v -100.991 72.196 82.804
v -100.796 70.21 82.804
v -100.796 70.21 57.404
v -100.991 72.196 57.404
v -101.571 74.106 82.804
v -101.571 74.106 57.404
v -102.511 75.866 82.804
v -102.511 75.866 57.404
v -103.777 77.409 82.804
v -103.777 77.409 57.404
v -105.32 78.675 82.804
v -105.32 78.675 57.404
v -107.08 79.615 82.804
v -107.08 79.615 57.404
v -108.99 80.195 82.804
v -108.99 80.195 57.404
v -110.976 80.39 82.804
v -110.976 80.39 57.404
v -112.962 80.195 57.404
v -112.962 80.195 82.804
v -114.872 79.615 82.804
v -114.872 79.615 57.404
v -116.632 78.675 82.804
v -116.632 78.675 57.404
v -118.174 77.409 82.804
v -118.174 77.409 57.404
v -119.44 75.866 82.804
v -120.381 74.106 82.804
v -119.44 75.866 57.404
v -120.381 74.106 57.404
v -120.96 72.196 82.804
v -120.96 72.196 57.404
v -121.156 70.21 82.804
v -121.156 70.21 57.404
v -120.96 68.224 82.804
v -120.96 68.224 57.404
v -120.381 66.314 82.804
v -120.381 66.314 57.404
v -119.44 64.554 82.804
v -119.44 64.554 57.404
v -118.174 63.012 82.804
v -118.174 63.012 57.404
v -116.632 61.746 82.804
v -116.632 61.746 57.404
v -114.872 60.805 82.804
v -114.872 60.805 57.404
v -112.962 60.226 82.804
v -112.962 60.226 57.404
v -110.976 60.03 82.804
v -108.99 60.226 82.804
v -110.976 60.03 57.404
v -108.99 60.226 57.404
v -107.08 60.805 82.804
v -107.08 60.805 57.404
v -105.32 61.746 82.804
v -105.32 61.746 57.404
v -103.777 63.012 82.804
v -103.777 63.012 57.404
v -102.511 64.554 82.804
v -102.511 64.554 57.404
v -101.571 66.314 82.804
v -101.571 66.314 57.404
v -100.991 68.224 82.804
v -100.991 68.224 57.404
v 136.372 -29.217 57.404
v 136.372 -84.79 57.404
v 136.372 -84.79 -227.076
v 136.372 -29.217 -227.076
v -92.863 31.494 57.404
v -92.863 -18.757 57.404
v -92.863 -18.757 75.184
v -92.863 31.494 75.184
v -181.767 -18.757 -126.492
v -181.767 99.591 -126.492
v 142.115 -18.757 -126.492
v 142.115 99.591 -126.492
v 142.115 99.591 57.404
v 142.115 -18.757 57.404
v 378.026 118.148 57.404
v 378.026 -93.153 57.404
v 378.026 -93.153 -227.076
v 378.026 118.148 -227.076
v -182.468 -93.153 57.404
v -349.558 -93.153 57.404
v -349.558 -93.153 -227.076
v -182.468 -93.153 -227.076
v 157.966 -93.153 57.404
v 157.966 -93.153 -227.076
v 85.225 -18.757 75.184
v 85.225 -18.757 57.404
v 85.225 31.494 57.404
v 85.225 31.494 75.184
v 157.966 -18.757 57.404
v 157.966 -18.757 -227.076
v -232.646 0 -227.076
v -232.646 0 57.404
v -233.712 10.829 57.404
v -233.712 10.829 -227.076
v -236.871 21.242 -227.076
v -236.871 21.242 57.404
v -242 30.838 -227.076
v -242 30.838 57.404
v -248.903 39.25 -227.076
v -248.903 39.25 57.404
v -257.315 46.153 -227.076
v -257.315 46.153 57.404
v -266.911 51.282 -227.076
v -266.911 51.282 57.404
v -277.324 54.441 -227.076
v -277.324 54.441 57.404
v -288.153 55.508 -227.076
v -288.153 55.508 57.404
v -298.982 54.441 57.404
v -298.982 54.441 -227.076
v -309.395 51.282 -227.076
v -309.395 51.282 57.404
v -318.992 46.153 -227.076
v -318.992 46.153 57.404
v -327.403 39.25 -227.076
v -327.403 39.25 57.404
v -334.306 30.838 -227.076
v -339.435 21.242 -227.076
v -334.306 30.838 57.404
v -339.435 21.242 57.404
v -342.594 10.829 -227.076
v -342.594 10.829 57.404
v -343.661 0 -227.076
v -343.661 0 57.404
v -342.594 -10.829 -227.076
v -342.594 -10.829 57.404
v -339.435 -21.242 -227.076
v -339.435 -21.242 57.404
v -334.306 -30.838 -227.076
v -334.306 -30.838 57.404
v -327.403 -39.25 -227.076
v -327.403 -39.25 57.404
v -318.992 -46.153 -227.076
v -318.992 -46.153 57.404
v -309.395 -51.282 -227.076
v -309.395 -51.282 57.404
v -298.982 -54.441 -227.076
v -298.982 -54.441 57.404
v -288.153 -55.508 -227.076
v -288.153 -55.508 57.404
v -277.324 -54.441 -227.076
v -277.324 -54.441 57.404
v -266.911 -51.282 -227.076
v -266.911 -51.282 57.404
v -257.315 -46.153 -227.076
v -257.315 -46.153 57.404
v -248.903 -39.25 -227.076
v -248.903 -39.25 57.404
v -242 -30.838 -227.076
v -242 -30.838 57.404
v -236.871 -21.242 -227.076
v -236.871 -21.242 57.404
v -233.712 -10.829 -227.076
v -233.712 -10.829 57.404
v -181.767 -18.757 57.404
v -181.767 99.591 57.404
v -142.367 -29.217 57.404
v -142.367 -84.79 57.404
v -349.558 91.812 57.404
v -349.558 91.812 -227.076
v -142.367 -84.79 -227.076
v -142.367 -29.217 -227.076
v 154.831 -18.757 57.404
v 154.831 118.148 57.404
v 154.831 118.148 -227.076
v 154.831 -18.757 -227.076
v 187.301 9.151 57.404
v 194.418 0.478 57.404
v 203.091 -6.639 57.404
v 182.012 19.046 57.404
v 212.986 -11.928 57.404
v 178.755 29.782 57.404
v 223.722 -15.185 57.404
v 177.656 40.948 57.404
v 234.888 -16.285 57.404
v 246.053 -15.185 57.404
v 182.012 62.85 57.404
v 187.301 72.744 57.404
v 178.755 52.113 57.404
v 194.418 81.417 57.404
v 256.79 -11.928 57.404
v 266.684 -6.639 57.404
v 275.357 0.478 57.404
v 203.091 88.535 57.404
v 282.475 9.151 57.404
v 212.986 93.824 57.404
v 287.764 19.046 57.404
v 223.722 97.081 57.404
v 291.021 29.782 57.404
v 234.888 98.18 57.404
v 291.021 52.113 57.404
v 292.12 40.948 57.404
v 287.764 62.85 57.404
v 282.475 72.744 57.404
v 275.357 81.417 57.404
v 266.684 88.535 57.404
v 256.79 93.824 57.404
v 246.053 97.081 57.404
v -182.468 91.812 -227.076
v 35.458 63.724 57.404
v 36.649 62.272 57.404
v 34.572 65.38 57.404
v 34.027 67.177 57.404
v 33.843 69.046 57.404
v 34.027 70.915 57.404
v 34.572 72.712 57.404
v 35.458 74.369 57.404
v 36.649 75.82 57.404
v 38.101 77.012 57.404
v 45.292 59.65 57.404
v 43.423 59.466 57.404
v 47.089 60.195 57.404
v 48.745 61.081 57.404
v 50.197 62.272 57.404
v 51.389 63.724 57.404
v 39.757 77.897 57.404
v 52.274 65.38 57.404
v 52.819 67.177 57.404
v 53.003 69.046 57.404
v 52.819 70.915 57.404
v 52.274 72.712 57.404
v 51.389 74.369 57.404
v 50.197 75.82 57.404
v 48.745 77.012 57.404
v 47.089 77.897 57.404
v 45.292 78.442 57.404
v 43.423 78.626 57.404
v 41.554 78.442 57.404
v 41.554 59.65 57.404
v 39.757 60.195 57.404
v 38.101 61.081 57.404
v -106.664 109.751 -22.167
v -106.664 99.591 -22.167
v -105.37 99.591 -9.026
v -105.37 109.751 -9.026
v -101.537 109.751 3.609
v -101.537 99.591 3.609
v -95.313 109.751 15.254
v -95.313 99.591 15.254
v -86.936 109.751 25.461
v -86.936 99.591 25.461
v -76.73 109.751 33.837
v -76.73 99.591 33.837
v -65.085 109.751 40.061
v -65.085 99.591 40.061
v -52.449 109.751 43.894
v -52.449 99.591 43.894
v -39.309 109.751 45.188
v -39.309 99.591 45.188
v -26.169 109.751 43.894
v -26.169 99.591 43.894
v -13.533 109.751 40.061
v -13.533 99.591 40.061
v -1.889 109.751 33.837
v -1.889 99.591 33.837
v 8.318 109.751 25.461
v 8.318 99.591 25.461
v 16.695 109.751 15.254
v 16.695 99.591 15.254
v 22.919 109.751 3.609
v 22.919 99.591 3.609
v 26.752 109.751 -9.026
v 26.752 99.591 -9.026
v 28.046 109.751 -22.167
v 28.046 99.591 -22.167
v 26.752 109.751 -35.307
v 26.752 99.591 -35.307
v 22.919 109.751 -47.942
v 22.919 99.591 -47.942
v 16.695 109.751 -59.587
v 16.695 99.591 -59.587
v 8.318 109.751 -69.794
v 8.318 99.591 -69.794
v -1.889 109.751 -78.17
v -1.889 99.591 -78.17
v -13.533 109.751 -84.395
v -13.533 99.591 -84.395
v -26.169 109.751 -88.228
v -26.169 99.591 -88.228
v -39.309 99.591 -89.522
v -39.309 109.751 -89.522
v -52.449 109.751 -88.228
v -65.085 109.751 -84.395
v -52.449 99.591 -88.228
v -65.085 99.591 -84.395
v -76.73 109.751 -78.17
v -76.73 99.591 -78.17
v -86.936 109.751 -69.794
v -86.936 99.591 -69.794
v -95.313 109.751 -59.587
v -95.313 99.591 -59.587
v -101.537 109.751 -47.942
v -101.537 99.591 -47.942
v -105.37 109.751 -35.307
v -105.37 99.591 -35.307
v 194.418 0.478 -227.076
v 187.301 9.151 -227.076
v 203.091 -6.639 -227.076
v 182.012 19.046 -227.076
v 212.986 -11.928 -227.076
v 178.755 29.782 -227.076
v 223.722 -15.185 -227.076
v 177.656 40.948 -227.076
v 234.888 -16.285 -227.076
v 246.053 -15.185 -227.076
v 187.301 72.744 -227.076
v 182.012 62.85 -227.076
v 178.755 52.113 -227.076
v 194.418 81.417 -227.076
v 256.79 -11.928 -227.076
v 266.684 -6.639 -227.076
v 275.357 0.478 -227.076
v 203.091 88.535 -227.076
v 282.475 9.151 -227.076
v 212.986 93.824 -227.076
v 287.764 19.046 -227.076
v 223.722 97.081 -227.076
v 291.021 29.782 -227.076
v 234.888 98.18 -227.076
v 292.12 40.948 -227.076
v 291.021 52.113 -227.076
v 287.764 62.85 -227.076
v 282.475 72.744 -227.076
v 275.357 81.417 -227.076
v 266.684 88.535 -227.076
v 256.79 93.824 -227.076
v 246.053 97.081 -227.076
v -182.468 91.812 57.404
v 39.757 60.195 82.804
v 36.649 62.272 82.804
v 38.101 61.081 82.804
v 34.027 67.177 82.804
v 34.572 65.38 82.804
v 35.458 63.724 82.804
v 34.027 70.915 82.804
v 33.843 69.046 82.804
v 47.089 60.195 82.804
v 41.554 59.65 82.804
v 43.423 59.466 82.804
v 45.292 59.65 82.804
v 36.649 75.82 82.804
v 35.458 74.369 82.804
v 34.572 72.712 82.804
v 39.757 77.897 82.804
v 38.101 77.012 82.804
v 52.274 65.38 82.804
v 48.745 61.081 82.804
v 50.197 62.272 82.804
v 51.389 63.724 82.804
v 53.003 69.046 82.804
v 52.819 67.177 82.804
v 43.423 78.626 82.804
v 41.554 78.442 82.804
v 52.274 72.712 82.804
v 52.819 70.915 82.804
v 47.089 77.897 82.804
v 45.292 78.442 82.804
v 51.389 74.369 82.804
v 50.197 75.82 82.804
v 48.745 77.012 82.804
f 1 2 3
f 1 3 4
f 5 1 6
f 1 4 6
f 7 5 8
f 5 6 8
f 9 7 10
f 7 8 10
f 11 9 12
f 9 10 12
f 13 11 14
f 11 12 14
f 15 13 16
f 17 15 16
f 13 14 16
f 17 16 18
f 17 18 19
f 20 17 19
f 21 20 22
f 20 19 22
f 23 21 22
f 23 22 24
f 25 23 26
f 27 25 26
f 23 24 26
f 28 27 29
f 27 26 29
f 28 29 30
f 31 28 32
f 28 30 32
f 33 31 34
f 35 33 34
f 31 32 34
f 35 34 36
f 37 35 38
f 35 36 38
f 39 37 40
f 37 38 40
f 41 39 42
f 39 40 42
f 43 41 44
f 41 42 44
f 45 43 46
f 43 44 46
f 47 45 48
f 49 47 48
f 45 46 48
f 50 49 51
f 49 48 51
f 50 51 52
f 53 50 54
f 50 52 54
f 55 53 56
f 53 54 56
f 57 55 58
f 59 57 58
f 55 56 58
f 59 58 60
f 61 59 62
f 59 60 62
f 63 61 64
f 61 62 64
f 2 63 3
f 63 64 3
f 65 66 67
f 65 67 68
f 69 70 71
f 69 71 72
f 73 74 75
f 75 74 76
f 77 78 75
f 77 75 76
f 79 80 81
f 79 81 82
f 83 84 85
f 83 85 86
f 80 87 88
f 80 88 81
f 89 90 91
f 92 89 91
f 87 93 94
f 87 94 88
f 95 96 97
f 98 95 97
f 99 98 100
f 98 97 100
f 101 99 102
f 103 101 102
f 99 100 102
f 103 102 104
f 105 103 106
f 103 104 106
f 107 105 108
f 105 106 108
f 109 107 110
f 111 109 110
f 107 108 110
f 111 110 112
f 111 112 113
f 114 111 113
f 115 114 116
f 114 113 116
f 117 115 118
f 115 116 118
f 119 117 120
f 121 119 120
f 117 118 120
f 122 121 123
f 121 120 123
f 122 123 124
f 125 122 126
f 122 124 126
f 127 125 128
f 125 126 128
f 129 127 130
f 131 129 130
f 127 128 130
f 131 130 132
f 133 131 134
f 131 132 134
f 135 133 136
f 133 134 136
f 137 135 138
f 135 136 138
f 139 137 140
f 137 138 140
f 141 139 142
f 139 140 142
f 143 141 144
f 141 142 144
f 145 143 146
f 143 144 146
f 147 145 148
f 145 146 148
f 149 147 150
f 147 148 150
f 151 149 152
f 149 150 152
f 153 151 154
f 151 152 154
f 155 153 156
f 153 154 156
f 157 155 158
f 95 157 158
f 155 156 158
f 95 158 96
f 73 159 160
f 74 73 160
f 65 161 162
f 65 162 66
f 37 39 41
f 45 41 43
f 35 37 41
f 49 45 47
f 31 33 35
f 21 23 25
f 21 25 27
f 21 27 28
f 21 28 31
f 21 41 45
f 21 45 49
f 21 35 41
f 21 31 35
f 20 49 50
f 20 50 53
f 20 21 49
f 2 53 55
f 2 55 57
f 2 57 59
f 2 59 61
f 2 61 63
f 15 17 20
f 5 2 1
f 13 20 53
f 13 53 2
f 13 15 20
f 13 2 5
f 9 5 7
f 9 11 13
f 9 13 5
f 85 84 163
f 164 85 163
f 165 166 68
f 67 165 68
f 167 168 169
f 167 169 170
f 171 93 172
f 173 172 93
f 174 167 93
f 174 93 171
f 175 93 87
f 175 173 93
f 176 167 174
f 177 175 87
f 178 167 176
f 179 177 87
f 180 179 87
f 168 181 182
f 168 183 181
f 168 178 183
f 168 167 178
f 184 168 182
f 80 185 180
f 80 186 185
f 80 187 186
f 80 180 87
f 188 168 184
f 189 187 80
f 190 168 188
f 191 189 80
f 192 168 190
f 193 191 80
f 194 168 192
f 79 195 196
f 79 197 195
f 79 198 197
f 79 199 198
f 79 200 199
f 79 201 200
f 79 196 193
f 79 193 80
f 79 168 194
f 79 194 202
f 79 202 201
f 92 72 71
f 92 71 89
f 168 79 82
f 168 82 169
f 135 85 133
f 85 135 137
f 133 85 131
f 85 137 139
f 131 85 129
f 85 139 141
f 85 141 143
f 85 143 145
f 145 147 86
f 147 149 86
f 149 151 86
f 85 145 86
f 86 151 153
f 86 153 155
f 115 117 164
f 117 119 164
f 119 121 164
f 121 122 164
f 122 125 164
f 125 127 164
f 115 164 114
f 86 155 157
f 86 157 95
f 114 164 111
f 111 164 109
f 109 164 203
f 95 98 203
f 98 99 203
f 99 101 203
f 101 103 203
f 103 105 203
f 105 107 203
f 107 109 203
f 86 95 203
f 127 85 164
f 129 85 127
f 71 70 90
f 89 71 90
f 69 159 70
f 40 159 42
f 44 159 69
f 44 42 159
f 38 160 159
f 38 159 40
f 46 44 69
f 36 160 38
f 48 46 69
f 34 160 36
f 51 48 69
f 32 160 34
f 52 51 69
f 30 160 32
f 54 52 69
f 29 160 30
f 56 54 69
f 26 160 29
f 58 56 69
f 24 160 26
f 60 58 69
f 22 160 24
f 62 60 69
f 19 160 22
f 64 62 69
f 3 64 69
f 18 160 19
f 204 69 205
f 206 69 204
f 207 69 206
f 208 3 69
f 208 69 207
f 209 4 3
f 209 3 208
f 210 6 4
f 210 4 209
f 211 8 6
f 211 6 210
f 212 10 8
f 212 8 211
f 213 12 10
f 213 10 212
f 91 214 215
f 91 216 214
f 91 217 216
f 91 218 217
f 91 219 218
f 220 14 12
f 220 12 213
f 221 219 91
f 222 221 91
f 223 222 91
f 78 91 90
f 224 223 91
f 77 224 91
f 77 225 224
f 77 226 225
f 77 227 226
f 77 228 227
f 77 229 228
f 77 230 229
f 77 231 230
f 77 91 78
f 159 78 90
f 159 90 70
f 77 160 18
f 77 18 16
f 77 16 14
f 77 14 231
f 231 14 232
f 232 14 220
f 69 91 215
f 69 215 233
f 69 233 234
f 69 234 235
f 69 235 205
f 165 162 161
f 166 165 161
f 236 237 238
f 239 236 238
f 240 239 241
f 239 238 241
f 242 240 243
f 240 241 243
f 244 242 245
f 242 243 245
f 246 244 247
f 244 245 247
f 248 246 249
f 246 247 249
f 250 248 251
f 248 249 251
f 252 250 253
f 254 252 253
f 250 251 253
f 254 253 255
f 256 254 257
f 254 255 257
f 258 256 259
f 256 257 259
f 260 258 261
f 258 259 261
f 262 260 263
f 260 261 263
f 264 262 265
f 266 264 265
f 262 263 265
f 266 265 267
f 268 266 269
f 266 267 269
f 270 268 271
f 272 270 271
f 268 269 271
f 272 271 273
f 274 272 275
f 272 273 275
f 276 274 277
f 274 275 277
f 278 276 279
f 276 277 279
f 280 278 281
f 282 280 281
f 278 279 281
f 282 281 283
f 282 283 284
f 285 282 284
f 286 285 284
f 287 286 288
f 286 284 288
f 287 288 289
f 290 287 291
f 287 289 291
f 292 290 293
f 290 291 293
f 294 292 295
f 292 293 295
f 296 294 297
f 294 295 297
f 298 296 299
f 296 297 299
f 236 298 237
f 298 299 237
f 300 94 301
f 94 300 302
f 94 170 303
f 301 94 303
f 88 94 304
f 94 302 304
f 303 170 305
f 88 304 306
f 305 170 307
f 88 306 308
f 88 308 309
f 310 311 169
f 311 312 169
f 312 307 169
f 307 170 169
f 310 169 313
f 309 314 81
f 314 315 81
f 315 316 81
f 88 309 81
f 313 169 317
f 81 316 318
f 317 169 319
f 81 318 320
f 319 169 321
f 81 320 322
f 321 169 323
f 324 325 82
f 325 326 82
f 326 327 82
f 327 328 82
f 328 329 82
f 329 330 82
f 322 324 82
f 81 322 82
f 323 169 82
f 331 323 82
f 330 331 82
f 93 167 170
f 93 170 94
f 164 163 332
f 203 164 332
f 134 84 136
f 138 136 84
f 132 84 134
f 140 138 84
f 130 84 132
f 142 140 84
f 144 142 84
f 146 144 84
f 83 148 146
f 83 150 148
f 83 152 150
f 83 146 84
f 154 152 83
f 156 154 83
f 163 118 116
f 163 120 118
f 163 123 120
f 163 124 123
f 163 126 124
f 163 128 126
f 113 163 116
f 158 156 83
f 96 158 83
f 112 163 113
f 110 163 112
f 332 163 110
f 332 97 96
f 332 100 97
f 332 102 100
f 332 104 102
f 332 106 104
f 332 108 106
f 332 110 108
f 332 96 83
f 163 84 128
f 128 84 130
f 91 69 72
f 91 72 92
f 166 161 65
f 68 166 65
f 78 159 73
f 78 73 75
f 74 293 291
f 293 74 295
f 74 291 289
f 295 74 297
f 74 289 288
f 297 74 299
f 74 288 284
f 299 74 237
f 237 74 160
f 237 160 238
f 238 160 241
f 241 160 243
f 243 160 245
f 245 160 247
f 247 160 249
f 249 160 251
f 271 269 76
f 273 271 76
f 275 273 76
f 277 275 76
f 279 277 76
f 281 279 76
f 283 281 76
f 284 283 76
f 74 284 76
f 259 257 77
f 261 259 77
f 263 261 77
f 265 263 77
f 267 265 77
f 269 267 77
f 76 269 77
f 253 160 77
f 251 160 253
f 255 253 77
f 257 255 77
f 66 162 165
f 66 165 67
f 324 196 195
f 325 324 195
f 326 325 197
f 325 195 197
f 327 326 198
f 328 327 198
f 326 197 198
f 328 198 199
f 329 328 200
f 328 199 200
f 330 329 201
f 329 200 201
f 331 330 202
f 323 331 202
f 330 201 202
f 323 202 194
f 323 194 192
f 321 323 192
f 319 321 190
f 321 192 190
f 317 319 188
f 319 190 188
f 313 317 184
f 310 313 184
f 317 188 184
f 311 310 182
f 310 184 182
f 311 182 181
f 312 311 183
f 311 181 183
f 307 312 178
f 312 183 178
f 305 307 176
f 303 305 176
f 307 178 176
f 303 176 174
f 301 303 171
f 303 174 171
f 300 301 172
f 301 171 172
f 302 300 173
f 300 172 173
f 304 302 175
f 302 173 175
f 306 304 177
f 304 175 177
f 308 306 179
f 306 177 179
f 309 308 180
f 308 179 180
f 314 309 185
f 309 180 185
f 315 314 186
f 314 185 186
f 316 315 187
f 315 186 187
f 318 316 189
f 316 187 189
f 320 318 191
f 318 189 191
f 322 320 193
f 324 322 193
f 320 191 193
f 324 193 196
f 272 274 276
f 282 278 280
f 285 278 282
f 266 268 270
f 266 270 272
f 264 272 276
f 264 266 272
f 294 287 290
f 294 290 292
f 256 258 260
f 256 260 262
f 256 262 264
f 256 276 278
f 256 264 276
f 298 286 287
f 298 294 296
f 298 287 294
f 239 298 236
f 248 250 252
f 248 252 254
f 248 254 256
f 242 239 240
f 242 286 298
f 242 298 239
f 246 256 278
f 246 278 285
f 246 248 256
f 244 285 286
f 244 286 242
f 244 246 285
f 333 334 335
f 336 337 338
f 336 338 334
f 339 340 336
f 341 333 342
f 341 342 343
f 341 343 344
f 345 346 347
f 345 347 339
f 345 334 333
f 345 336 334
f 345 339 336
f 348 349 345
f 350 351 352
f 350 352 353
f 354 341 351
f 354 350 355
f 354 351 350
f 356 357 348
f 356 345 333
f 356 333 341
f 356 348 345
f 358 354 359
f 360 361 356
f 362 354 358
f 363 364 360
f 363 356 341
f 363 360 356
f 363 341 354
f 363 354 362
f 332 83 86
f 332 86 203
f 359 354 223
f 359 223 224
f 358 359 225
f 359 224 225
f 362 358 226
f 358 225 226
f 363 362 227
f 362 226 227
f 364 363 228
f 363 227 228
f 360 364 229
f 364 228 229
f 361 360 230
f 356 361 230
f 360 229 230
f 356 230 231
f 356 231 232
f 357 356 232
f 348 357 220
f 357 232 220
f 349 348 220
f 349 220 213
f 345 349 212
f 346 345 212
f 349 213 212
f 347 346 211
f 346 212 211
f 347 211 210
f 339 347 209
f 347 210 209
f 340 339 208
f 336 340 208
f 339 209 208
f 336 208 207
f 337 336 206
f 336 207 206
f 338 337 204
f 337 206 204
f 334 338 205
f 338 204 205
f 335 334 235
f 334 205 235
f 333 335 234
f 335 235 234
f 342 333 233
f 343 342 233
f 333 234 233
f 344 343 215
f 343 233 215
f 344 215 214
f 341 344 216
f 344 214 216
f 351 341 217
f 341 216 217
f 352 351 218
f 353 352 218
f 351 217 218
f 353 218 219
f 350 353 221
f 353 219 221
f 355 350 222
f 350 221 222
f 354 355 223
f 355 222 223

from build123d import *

# Parameters (mm, degrees)
F0_W      = 204.554647
F0_H      = 31.726852
F1_DEPTH  = 57.404
F2_R      = 10.180091
F2_R_2    = 9.580013
F3_DEPTH  = 25.4
F4_W      = 323.881835
F4_H      = 118.348116
F5_DEPTH  = 183.896
F7_W      = 278.738513
F7_H      = 55.573529
F6_R      = 57.23236
F6_W      = 167.090893
F6_H      = 184.964478
F6_R_2    = 55.507596
F8_DEPTH  = 284.48
F9_R      = 67.35509
F10_DEPTH = 10.16
F11_W     = 178.08751
F11_H     = 50.251937
F12_DEPTH = 17.78


with BuildPart() as f1:
    # F0 (on Top) → F1 (new body)
    with BuildSketch(Plane.XY):
        with Locations((-32.674968, 70.063397)):
            Rectangle(F0_W, F0_H)
    extrude(amount=F1_DEPTH)

    # F2 (on face) → F3 (join)
    with BuildSketch(Plane.XY.offset(57.404)):
        with Locations((-110.975839, 70.210218)):
            Circle(F2_R)
        with Locations((43.423027, 69.046147)):
            Circle(F2_R_2)
    extrude(amount=F3_DEPTH)

    # F4 (on face) → F5 (join)
    with BuildSketch(Plane.XY.offset(57.404)):
        with Locations((-19.826323, 40.416601)):
            Rectangle(F4_W, F4_H)
    extrude(amount=-F5_DEPTH)

    # F9 (on face) → F10 (join)
    with BuildSketch(Plane(origin=(0, 99.590659, 0), x_dir=(-1, 0, 0), z_dir=(0, 1, 0))):
        with Locations((39.309025, -22.16666)):
            Circle(F9_R)
    extrude(amount=F10_DEPTH)

    # F11 (on face) → F12 (join)
    with BuildSketch(Plane.XY.offset(57.404)):
        with Locations((-3.818918, 6.368512)):
            Rectangle(F11_W, F11_H)
    extrude(amount=F12_DEPTH)


with BuildPart() as f8:
    # F7 (on face) + F6 (on face) → F8 (new body)
    with BuildSketch(Plane.XY.offset(57.404)):
        with Locations((-2.99763, -57.003659)):
            Rectangle(F7_W, F7_H)
    with BuildSketch(Plane.XY.offset(57.404)):
        Polygon((154.830679, 118.148223), (154.830679, -18.757457), (157.965928, -18.757457), (157.965928, -93.152933), (378.026277, -93.152933), (378.026277, 118.148223), align=None)
        with Locations((234.887868, 40.947847)):
            Circle(F6_R, mode=Mode.SUBTRACT)
        with Locations((-266.012996, -0.670694)):
            Rectangle(F6_W, F6_H)
        with Locations((-288.153142, 0)):
            Circle(F6_R_2, mode=Mode.SUBTRACT)
    extrude(amount=-F8_DEPTH)


solid = Compound([f1.part, f8.part])
